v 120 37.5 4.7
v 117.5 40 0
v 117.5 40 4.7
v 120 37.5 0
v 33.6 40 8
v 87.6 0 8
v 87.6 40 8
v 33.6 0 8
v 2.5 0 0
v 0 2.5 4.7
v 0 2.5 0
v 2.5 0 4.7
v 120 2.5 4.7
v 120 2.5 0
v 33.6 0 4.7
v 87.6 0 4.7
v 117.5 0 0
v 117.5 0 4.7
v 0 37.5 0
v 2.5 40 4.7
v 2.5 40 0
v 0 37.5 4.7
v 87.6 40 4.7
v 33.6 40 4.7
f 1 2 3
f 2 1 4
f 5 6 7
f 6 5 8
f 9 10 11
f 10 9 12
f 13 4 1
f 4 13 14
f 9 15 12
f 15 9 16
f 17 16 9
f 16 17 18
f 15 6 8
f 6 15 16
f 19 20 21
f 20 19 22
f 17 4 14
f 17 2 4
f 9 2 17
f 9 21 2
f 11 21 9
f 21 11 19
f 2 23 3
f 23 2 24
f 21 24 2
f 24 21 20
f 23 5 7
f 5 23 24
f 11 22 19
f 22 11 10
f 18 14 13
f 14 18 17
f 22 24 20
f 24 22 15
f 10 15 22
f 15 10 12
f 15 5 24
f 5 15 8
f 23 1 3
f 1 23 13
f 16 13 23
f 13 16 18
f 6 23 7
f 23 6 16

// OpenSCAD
$fn = 32;

// ----------------------------------------------------------------------
// Stepped bar: centerstep, 120 x 40 x 8/4.7 mm
// ----------------------------------------------------------------------

// --- parameters (mm) ---
bar_l = 120;              // bar length, X
bar_w = 40;               // bar width, Y
plate_t = 8;              // thickness of the thick zone, Z
thin_t = 4.7;             // thickness of the thin zone
corner_c = 2.5;           // corner chamfer of the bar
step_cut = 3.3;           // material removed from the thin zone
thick_from = 33.6;        // start of the thick middle zone
thick_to = 87.6;          // end of the thick middle zone
depth_1 = 3.3;            // depth of cut 1 from the top face
depth_2 = 3.3;            // depth of cut 2 from the top face

profile = [[2.5, 0], [117.5, 0], [120, 2.5], [120, 37.5], [117.5, 40], [2.5, 40], [0, 37.5], [0, 2.5]];  // primary outline, 8 points, counter clockwise
void_1 = [[-1, -1], [33.6, -1], [33.6, 41], [-1, 41]];  // thin left end, 4 points
void_2 = [[87.6, -1], [121, -1], [121, 41], [87.6, 41]];  // thin right end, 4 points

// --- the one profile operation ---
difference() {
  linear_extrude(height = plate_t) polygon(points = profile);
  translate([0, 0, plate_t - depth_1])
    linear_extrude(height = depth_1 + 1) polygon(points = void_1);
  translate([0, 0, plate_t - depth_2])
    linear_extrude(height = depth_2 + 1) polygon(points = void_2);
}
